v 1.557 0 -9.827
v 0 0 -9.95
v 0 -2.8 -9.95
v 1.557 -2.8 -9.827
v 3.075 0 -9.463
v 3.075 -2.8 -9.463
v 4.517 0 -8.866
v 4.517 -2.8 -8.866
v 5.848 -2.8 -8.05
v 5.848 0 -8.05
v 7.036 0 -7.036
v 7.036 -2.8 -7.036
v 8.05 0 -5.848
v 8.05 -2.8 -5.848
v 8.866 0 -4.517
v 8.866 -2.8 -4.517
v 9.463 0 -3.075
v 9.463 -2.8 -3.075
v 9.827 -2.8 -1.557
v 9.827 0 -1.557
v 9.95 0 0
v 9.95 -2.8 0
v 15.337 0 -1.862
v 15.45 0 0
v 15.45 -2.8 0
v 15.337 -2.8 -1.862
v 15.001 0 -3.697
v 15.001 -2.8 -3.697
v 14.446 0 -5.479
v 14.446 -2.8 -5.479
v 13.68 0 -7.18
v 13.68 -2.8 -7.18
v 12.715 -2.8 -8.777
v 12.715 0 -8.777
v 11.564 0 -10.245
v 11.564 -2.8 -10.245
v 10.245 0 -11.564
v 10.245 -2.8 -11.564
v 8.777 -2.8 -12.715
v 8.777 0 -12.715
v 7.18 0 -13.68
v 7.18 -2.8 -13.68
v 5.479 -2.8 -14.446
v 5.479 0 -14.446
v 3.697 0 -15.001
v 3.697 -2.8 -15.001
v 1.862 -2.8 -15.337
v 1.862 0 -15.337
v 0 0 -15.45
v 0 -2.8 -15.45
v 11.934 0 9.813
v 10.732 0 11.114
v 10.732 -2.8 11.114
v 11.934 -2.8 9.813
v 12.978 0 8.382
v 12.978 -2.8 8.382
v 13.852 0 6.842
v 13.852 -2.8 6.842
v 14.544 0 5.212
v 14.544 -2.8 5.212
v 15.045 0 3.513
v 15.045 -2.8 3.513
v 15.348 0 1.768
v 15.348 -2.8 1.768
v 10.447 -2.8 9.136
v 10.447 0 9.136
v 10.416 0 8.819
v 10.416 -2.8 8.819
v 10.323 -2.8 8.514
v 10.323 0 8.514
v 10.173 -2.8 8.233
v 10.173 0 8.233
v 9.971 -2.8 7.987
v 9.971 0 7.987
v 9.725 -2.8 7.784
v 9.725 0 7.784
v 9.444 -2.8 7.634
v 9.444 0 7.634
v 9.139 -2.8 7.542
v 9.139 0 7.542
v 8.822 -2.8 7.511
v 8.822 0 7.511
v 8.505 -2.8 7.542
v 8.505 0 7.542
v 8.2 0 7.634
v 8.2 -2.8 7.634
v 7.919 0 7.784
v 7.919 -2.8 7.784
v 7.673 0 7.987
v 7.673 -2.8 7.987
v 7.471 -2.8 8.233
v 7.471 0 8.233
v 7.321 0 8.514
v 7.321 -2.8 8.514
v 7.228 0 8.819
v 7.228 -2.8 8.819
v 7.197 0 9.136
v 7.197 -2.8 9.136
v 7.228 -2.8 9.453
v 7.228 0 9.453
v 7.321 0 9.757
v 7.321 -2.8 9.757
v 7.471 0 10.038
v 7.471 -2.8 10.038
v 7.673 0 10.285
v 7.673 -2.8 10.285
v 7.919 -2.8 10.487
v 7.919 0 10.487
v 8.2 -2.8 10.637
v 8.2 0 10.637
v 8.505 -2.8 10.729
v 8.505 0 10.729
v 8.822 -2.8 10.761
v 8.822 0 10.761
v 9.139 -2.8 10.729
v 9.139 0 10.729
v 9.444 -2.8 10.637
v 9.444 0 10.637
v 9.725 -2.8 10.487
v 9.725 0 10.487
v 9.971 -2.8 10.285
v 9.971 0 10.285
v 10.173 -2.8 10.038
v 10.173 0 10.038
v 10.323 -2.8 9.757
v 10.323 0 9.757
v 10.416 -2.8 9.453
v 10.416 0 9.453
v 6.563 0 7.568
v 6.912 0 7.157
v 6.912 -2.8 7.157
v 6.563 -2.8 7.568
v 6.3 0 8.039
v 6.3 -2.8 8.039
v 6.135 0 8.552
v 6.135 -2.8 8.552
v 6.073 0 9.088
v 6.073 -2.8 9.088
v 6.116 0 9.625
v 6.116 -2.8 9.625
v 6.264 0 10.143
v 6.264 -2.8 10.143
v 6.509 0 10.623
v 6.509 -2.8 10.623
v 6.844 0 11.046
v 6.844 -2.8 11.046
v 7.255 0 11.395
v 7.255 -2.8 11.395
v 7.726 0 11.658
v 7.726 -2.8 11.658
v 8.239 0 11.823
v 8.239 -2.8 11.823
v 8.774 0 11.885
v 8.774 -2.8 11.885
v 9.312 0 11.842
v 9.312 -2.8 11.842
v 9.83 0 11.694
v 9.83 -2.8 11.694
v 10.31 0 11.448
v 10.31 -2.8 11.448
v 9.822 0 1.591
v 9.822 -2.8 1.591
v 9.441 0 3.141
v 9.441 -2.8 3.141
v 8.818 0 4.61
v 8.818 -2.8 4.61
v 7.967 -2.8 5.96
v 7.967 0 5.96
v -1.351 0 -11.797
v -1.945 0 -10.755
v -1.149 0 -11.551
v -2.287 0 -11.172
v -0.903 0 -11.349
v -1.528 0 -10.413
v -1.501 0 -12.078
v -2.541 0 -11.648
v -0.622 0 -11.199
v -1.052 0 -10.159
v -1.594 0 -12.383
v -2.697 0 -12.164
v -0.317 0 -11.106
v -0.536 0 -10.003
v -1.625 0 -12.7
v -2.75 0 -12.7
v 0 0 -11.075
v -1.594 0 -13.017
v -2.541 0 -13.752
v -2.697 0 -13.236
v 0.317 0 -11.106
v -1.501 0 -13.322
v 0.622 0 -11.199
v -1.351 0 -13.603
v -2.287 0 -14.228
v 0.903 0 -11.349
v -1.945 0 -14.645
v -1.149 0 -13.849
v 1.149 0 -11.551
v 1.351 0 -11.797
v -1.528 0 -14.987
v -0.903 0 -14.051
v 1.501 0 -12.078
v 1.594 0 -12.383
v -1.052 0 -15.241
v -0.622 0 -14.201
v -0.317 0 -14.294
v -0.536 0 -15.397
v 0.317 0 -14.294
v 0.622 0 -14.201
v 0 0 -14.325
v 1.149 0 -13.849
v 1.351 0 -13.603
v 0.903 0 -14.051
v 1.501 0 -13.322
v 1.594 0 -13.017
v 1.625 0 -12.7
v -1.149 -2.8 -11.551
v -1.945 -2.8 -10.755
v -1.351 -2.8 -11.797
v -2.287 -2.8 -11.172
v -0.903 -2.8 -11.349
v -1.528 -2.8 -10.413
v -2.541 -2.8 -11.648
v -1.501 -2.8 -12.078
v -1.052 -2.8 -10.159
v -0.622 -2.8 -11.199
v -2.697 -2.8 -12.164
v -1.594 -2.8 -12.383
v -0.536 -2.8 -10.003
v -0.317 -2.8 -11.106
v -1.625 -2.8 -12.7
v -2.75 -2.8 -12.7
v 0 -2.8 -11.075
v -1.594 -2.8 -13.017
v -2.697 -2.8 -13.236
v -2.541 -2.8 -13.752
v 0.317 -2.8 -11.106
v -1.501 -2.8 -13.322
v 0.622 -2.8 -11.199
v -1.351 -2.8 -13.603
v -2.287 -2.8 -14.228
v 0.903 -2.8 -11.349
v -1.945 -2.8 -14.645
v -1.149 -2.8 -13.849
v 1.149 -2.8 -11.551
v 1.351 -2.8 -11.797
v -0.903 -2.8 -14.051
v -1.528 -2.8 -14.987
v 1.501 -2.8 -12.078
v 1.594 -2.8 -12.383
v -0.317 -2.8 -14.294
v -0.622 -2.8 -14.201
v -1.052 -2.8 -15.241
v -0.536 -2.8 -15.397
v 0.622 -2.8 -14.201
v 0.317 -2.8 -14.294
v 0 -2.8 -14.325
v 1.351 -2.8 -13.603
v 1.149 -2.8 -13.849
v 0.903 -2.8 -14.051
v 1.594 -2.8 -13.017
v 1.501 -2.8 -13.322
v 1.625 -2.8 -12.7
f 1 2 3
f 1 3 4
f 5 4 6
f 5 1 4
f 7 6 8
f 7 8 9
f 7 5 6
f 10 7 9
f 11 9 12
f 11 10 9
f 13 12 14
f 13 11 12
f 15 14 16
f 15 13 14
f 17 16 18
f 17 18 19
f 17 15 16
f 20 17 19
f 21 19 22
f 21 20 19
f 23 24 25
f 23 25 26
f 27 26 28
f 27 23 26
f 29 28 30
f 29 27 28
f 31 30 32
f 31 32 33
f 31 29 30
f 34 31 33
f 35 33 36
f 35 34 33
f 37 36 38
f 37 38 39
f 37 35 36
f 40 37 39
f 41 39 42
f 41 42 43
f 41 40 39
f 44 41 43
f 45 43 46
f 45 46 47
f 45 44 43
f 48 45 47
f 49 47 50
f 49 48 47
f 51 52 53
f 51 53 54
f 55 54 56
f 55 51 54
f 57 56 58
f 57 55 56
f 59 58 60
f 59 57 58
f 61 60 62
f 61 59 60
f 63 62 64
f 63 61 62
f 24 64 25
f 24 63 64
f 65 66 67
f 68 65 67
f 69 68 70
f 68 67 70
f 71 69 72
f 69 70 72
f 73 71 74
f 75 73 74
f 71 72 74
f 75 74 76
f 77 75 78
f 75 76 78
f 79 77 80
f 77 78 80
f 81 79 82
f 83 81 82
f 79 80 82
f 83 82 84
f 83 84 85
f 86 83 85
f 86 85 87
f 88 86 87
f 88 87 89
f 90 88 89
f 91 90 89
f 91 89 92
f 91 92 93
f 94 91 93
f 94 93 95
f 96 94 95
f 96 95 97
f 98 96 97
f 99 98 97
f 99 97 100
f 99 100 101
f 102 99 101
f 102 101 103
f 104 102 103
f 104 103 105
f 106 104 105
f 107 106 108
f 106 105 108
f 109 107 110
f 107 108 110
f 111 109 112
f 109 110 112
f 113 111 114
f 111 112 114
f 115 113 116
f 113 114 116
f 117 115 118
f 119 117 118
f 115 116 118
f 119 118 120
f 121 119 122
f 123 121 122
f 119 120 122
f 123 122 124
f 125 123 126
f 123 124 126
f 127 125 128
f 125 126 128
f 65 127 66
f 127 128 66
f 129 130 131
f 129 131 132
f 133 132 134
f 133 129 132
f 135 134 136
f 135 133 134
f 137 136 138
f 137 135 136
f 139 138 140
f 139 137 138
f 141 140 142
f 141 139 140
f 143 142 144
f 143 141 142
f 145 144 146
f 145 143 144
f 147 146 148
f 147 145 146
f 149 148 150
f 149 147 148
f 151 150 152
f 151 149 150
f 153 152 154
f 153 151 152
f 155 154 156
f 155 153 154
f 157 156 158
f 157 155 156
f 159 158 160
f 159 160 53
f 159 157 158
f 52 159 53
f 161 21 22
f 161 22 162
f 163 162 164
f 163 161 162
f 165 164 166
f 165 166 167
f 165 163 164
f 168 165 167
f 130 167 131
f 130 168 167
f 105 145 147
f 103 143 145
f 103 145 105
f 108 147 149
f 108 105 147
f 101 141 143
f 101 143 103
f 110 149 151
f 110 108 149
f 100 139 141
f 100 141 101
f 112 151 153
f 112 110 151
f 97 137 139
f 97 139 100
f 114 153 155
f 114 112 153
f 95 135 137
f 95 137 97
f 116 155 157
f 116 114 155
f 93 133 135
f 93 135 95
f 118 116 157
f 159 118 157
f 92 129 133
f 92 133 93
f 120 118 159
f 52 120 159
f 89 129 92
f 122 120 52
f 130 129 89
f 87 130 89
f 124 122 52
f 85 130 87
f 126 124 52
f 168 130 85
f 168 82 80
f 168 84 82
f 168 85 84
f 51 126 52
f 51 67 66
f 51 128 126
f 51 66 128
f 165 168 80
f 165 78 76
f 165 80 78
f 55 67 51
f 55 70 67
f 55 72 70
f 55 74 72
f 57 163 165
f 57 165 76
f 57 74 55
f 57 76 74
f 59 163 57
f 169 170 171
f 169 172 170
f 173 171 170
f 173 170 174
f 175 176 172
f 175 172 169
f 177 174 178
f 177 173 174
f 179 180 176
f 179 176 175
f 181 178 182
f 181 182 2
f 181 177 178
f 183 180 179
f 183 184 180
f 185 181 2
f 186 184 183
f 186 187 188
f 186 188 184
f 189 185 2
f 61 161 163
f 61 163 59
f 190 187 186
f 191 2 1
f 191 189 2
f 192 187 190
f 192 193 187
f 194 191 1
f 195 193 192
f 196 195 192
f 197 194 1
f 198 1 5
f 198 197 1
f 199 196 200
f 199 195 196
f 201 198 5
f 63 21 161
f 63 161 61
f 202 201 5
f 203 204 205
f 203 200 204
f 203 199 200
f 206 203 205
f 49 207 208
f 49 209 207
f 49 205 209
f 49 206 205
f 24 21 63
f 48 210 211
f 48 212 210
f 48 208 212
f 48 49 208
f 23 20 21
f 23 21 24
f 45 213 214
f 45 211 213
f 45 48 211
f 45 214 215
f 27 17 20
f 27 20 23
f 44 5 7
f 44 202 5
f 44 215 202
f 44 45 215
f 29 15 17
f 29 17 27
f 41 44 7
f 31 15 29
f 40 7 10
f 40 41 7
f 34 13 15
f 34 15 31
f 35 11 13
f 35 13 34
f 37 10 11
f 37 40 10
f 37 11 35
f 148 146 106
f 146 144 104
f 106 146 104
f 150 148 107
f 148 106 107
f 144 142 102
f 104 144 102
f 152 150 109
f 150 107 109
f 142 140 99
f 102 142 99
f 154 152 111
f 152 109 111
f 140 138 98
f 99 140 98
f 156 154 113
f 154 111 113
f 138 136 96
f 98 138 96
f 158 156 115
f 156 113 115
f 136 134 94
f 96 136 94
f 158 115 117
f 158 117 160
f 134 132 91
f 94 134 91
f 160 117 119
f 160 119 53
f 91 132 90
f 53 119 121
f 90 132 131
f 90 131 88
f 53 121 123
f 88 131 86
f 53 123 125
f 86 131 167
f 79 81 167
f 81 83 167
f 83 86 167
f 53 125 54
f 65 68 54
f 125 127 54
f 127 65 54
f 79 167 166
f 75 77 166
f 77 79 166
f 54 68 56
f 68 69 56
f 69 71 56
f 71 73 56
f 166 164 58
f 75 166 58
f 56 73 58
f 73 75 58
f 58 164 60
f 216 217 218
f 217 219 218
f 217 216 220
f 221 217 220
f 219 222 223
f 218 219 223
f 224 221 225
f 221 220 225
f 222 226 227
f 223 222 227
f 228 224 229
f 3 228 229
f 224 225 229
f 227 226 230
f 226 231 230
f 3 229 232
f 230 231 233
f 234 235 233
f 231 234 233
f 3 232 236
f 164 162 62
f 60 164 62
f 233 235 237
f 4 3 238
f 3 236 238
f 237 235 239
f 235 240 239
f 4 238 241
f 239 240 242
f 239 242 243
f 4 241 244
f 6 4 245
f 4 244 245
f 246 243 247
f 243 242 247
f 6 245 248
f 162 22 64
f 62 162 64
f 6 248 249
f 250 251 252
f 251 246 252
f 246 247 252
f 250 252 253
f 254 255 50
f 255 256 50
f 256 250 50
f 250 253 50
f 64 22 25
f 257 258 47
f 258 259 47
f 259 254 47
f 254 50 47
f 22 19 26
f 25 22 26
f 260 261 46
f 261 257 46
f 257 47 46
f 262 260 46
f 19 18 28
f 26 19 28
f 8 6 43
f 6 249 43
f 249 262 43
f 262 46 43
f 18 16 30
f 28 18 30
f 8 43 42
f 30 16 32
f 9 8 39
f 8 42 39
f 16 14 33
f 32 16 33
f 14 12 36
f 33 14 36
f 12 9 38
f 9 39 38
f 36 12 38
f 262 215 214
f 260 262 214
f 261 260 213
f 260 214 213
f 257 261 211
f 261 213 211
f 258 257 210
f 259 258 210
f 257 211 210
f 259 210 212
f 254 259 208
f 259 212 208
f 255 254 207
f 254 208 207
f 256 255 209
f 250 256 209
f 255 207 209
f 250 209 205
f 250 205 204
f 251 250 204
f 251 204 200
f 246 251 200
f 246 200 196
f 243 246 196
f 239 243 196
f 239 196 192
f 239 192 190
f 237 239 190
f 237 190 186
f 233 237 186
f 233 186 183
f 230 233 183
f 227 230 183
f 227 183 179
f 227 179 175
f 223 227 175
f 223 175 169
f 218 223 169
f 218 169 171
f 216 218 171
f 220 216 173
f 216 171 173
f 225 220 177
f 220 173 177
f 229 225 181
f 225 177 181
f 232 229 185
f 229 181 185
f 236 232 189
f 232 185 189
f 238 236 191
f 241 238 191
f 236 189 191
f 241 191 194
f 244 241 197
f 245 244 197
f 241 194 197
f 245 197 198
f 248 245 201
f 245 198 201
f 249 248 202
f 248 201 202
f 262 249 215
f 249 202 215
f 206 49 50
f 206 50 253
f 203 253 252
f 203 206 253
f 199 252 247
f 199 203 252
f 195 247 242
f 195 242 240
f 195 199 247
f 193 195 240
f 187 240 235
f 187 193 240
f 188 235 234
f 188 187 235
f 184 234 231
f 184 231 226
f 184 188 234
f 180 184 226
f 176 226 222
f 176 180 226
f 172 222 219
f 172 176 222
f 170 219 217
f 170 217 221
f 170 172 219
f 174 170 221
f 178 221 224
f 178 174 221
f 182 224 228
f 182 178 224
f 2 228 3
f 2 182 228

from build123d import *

# Parameters (mm, degrees)
ESTRUSIONE_ESTRUSIONE1_DEPTH = 2.8
SCHIZZO3_R                   = 1.625
TAGLIO_ESTRUSIONE1_DEPTH     = 3.8


with BuildPart() as part:
    # Schizzo1 → Estrusione-Estrusione1 (new body)
    with BuildSketch(Plane(origin=(0, 0, 0), x_dir=(1, 0, 0), z_dir=(0, 1, 0))):
        with BuildLine():
            Line((0, 12.183185174), (0, 9.95))
            ThreePointArc((0, 9.95), (7.035712473, 7.035712473), (9.95, 0))
            ThreePointArc((9.95, 0), (9.159023292, -3.887774728), (6.911850786, -7.157431013))
            ThreePointArc((6.911850786, -7.157431013), (6.843976854, -11.045925983), (10.732471824, -11.113799915))
            ThreePointArc((10.732471824, -11.113799915), (14.221799986, -6.036795935), (15.45, 0))
            ThreePointArc((15.45, 0), (10.924799769, 10.924799769), (0, 15.45))
            Line((0, 15.45), (0, 12.183185174))
        make_face()
        with BuildLine():
            ThreePointArc((0, 15.45), (-2.75, 12.7), (0, 9.95))
            Line((0, 9.95), (0, 12.183185174))
            Line((0, 12.183185174), (0, 15.45))
        make_face()
    extrude(amount=-ESTRUSIONE_ESTRUSIONE1_DEPTH)

    # Schizzo3 → Taglio-Estrusione1 (cut, through all)
    with BuildSketch(Plane(origin=(0, 0, 0), x_dir=(1, 0, 0), z_dir=(0, 1, 0))):
        with Locations((0, 12.7)):
            Circle(SCHIZZO3_R)
        with Locations((8.822161305, -9.135615464)):
            Circle(SCHIZZO3_R)
    extrude(amount=-TAGLIO_ESTRUSIONE1_DEPTH, mode=Mode.SUBTRACT)


solid = part.part
